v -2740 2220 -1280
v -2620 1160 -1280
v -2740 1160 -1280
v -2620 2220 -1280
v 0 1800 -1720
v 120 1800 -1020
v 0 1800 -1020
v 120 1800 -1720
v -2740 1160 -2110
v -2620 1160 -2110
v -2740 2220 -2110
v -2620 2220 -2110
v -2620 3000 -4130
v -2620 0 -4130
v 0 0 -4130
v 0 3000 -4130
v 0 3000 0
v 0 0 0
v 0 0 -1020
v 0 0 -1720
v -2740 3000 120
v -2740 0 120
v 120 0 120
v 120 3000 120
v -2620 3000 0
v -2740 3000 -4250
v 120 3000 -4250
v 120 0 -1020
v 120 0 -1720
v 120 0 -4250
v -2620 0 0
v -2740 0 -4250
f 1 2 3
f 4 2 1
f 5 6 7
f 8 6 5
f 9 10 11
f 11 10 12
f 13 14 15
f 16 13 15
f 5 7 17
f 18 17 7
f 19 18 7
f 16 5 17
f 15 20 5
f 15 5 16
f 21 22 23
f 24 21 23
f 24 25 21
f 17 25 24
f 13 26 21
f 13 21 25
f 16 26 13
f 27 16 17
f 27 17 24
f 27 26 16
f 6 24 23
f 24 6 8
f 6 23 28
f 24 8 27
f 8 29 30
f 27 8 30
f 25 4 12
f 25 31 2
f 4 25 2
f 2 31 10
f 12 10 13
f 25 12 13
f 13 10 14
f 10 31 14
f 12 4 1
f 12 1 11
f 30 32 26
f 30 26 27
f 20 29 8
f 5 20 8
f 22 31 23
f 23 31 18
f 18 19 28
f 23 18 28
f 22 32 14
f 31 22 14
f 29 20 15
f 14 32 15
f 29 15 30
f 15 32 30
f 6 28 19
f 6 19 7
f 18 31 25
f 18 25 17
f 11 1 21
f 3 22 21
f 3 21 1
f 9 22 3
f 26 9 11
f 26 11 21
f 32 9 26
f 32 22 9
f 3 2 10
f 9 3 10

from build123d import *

# Parameters (mm, degrees)
SKETCH_1_W          = 2860
SKETCH_1_H          = 4370
SKETCH_1_W_2        = 2620
SKETCH_1_H_2        = 4130
EXTRUDE_1_DEPTH     = 3000
CUT_EXTRUDE_1_REACH = 2862
SKETCH_2_W          = 700
SKETCH_2_H          = 1800
CUT_EXTRUDE_2_REACH = 122
SKETCH_3_W          = 830
SKETCH_3_H          = 1060


with BuildPart() as part:
    # 草图1 → 拉伸-薄壁1 (new body)
    with BuildSketch(Plane(origin=(0, 0, 0), x_dir=(1, 0, 0), z_dir=(0, 1, 0))):
        with Locations((-1310, 2065)):
            Rectangle(SKETCH_1_W, SKETCH_1_H)
        with Locations((-1310, 2065)):
            Rectangle(SKETCH_1_W_2, SKETCH_1_H_2, mode=Mode.SUBTRACT)
    extrude(amount=EXTRUDE_1_DEPTH)

    # 草图2 → 切除-拉伸1 (cut, up to next)
    with BuildSketch(Plane(origin=(120, 0, 0), x_dir=(0, 0, -1), z_dir=(1, 0, 0)), mode=Mode.PRIVATE) as cut_extrude_1_sk1:
        with Locations((1370, 900)):
            Rectangle(SKETCH_2_W, SKETCH_2_H)
    cut_extrude_1_tool1 = extrude(cut_extrude_1_sk1.sketch, amount=-CUT_EXTRUDE_1_REACH, mode=Mode.PRIVATE) & part.part
    add(cut_extrude_1_tool1.solids().sort_by_distance((120, 900, -1370))[0], mode=Mode.SUBTRACT)

    # 草图3 → 切除-拉伸2 (cut, up to next)
    with BuildSketch(Plane(origin=(-2620, 0, 0), x_dir=(0, 0, -1), z_dir=(1, 0, 0)), mode=Mode.PRIVATE) as cut_extrude_2_sk1:
        with Locations((1695, 1690)):
            Rectangle(SKETCH_3_W, SKETCH_3_H)
    cut_extrude_2_tool1 = extrude(cut_extrude_2_sk1.sketch, amount=-CUT_EXTRUDE_2_REACH, mode=Mode.PRIVATE) & part.part
    add(cut_extrude_2_tool1.solids().sort_by_distance((-2620, 1690, -1695))[0], mode=Mode.SUBTRACT)


solid = part.part
